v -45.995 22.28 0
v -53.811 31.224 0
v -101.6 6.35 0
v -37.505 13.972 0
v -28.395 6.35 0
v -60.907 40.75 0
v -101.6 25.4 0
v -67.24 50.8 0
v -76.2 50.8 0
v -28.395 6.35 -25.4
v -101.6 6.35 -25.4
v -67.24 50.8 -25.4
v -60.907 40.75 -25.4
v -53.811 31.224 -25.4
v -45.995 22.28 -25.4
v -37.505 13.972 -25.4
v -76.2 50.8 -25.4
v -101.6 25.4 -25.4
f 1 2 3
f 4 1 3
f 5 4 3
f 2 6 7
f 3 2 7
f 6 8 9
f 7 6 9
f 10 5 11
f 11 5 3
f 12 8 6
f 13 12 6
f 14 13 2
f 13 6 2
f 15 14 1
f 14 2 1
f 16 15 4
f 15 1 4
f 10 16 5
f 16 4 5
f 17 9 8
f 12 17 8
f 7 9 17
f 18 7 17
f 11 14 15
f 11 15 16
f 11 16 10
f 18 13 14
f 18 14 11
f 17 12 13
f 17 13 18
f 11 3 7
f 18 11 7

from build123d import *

# Parameters (mm, degrees)
BOSS_EXTRUDE1_DEPTH = 25.4
CHAMFER1_SIZE       = 25.4


with BuildPart() as part:
    # Sketch2 → Boss-Extrude1 (new body)
    with BuildSketch(Plane.XY):
        with BuildLine():
            Line((-28.394744795, 6.35), (-101.6, 6.35))
            Line((-101.6, 6.35), (-101.6, 50.8))
            Line((-101.6, 50.8), (-67.239627541, 50.8))
            ThreePointArc((-67.239627541, 50.8), (-49.99007984, 26.676106864), (-28.394744795, 6.35))
        make_face()
    extrude(amount=-BOSS_EXTRUDE1_DEPTH)

    # Chamfer1
    chamfer1_edges = [part.edges().sort_by_distance(p)[0] for p in [
        (-101.6, 50.8, -12.7),
    ]]
    chamfer(chamfer1_edges, length=CHAMFER1_SIZE)


solid = part.part
